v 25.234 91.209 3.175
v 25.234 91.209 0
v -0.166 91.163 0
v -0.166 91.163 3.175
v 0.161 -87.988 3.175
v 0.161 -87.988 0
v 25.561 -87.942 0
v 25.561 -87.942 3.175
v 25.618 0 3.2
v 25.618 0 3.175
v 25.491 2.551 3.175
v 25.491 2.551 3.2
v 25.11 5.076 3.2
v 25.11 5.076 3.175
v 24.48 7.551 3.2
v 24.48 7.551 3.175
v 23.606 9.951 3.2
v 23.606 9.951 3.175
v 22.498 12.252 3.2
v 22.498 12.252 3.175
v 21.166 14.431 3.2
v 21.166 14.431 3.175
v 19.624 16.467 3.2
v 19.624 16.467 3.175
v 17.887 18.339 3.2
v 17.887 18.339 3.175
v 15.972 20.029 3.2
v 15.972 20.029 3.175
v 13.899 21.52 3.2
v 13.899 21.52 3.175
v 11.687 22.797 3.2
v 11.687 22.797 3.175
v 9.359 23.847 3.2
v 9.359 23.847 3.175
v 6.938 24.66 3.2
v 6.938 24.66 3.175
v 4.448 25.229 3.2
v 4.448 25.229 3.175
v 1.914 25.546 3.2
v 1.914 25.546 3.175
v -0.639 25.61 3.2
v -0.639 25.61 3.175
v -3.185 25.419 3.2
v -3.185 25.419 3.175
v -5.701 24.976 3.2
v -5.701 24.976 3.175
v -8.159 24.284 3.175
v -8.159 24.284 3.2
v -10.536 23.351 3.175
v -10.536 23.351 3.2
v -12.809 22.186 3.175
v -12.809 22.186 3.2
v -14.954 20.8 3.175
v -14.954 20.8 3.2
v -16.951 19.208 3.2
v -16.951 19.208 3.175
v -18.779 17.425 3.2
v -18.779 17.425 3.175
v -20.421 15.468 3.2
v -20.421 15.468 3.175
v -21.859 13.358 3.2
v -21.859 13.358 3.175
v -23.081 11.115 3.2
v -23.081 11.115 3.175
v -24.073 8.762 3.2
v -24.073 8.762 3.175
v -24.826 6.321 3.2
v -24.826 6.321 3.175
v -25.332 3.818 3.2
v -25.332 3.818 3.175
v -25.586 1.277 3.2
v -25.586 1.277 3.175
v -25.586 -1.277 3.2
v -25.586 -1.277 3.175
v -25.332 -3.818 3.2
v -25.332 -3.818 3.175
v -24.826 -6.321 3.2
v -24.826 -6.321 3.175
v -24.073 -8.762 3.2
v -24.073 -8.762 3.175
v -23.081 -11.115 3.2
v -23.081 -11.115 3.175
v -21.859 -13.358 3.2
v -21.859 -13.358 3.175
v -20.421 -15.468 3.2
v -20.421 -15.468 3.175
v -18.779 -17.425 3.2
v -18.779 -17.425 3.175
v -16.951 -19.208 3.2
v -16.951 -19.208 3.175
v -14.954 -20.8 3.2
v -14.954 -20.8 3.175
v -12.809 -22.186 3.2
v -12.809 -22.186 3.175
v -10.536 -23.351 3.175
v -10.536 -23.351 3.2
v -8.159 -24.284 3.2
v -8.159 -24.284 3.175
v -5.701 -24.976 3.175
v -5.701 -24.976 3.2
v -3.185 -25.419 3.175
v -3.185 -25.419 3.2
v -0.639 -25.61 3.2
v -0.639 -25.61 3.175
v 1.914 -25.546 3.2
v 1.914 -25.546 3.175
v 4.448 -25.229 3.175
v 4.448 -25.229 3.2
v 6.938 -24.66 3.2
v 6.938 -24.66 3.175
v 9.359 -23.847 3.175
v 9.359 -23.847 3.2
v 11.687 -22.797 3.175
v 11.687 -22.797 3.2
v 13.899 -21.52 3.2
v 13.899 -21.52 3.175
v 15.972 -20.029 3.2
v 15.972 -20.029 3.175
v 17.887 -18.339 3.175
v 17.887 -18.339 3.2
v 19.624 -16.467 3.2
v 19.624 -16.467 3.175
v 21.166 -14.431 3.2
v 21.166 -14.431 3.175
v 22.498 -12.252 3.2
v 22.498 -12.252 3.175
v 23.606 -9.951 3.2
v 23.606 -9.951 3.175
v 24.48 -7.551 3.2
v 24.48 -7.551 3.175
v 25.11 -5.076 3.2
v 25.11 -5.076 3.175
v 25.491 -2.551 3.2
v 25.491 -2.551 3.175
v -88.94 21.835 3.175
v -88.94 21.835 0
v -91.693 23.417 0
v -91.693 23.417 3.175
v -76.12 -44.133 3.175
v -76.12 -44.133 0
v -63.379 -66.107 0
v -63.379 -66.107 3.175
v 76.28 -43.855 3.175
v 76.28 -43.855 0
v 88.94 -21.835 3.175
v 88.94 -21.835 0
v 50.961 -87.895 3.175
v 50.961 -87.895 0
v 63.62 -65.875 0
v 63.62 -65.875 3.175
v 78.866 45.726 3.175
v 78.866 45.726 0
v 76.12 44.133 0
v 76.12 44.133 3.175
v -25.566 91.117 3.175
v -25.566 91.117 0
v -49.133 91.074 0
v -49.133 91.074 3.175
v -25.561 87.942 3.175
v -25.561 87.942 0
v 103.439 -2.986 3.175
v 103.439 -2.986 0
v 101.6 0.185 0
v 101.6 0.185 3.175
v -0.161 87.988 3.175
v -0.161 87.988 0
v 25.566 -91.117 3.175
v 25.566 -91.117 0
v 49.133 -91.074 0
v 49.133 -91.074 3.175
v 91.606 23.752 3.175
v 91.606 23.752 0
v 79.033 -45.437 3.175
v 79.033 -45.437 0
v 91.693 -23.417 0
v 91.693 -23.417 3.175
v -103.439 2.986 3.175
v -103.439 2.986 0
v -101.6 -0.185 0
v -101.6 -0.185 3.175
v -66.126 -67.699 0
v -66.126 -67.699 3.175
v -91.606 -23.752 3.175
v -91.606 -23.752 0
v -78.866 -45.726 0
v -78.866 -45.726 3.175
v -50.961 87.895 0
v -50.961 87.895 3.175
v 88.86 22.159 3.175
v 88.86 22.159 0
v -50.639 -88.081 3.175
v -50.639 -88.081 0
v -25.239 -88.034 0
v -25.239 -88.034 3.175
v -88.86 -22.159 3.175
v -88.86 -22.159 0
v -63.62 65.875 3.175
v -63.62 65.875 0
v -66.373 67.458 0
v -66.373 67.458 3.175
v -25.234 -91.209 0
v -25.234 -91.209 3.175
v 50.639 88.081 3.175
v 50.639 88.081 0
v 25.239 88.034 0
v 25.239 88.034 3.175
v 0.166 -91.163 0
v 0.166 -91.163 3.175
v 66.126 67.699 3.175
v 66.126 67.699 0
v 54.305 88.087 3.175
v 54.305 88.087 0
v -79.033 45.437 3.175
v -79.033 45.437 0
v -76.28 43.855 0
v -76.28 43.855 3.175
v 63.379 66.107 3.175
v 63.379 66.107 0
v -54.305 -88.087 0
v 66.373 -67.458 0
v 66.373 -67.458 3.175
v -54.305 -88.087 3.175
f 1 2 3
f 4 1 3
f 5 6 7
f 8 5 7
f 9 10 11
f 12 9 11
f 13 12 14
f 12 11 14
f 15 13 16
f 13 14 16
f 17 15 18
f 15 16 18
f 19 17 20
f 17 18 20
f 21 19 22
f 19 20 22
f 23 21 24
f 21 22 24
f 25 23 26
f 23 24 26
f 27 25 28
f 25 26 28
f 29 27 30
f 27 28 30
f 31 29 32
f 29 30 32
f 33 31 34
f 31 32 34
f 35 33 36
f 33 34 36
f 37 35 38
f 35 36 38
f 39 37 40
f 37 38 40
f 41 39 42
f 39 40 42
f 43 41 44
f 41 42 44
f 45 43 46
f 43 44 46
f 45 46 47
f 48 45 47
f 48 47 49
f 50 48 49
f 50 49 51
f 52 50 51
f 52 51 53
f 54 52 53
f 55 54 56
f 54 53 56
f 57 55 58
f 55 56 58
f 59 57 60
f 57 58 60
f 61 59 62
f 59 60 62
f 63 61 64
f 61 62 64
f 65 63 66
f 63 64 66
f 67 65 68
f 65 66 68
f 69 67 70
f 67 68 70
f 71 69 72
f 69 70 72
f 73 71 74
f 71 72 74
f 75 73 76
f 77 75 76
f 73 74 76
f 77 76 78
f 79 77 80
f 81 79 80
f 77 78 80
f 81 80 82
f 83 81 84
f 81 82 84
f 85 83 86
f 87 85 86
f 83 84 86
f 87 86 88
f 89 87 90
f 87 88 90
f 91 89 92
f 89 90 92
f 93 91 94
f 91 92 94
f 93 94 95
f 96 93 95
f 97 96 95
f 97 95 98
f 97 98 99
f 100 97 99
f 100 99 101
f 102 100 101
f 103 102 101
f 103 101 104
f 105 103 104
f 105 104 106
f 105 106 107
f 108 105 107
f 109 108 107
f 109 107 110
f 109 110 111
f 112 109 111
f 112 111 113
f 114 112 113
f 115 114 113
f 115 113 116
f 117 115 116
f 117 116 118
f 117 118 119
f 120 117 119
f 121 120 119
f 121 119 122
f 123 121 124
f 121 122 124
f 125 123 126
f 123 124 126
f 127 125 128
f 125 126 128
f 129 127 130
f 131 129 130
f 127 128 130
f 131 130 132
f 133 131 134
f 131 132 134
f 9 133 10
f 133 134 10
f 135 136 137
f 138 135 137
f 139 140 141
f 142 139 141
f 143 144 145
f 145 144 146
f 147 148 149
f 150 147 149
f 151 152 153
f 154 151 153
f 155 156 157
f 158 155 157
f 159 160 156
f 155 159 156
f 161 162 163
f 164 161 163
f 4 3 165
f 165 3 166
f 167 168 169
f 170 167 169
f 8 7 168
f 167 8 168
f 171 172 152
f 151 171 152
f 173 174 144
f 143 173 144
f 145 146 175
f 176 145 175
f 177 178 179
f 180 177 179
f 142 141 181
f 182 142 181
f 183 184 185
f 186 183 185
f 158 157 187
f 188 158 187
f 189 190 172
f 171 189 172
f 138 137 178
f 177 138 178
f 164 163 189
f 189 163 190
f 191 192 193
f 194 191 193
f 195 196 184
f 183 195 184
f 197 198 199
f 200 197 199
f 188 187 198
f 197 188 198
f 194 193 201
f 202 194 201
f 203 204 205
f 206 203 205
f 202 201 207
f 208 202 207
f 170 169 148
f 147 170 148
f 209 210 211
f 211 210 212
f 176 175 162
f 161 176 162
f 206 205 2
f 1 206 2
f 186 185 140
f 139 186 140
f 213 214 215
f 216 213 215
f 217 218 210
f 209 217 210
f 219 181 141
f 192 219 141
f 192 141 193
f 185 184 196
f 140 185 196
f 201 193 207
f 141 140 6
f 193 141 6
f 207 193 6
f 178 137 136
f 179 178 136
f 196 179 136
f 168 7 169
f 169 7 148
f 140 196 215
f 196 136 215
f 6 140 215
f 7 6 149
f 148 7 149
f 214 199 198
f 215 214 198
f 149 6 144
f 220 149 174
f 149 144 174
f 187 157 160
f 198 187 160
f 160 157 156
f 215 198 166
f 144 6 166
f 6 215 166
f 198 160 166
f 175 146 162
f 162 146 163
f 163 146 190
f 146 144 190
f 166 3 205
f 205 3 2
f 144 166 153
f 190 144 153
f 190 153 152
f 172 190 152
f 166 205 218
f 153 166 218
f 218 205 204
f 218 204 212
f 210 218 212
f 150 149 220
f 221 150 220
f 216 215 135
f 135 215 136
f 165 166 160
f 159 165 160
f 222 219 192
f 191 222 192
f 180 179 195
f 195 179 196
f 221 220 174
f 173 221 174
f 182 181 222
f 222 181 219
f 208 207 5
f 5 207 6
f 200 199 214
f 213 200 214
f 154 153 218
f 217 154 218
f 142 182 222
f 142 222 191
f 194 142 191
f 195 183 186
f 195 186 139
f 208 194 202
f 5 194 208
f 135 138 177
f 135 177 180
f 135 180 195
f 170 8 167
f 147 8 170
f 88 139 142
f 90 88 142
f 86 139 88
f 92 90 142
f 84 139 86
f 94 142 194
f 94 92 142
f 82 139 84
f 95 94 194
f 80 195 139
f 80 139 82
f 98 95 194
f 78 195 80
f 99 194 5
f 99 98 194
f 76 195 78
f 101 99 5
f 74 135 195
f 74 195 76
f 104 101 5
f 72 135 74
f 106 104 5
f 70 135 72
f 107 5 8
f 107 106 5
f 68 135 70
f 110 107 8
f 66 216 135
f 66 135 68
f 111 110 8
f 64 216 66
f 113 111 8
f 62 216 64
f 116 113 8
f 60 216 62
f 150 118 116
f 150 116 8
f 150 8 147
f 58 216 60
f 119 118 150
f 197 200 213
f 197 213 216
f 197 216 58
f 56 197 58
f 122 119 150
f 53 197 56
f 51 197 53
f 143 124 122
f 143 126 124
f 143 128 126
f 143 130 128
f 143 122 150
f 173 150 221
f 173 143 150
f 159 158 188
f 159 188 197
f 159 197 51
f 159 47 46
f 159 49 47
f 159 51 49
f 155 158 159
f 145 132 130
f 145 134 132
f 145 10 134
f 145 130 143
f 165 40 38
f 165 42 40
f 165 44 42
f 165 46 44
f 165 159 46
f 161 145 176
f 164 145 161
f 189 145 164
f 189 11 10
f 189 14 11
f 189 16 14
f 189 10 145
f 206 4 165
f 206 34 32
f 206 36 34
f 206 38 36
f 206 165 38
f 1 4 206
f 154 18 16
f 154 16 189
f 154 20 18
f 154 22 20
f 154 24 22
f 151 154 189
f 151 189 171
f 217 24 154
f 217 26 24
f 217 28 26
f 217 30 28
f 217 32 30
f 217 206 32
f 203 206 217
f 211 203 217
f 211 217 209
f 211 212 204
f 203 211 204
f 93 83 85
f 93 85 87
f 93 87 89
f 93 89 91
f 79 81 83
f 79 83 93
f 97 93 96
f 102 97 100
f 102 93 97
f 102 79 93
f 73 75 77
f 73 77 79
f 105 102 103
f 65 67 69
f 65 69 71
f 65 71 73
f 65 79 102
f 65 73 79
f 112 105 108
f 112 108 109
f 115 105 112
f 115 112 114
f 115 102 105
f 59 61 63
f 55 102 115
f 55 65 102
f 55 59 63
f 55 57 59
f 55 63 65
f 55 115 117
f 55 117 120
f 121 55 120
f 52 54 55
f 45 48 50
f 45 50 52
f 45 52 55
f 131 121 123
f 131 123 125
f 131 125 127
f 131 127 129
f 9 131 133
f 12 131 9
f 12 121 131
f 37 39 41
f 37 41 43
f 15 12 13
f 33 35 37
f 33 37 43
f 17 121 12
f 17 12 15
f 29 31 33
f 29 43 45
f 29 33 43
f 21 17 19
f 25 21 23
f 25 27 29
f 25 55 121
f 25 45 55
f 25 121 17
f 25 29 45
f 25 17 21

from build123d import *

# Parameters (mm, degrees)
F1_DEPTH = 3.175
F2_R     = 25.617872
F3_DEPTH = 0.0254


with BuildPart() as f1:
    # F0 (on Top) → F1 (new body)
    with BuildSketch(Plane.XY):
        Polygon((63.379409, 66.106962), (50.639269, 88.080784), (25.239311, 88.034409), (-0.160646, 87.988034), (-25.560604, 87.94166), (-50.960562, 87.895285), (-63.620379, 65.875089), (-76.280196, 43.854893), (-88.940013, 21.834698), (-101.599831, -0.185498), (-88.85969, -22.15932), (-76.11955, -44.133141), (-63.379409, -66.106962), (-50.639269, -88.080784), (-25.239311, -88.034409), (0.160646, -87.988034), (25.560604, -87.94166), (50.960562, -87.895285), (63.620379, -65.875089), (76.280196, -43.854893), (88.940013, -21.834698), (101.599831, 0.185498), (88.85969, 22.15932), (76.11955, 44.133141), align=None)
        Polygon((-76.280196, 43.854893), (-63.620379, 65.875089), (-66.372903, 67.457566), (-79.032721, 45.437371), align=None)
        Polygon((-101.599831, -0.185498), (-88.940013, 21.834698), (-91.692538, 23.417175), (-103.438712, 2.98615), align=None)
        Polygon((-50.960562, 87.895285), (-25.560604, 87.94166), (-25.566401, 91.116654), (-49.133274, 91.073627), align=None)
        Polygon((-0.160646, 87.988034), (25.239311, 88.034409), (25.233515, 91.209404), (-0.166443, 91.163029), align=None)
        Polygon((54.305437, 88.087477), (50.639269, 88.080784), (63.379409, 66.106962), (66.126137, 67.69948), align=None)
        Polygon((78.866278, 45.725658), (76.11955, 44.133141), (88.85969, 22.15932), (91.606418, 23.751837), align=None)
        Polygon((103.438712, -2.98615), (101.599831, 0.185498), (88.940013, -21.834698), (91.692538, -23.417175), align=None)
        Polygon((79.032721, -45.437371), (76.280196, -43.854893), (63.620379, -65.875089), (66.372903, -67.457566), align=None)
        Polygon((49.133274, -91.073627), (50.960562, -87.895285), (25.560604, -87.94166), (25.566401, -91.116654), align=None)
        Polygon((0.166443, -91.163029), (0.160646, -87.988034), (-25.239311, -88.034409), (-25.233515, -91.209404), align=None)
        Polygon((-50.639269, -88.080784), (-63.379409, -66.106962), (-66.126137, -67.69948), (-54.305437, -88.087477), align=None)
        Polygon((-76.11955, -44.133141), (-88.85969, -22.15932), (-91.606418, -23.751837), (-78.866278, -45.725658), align=None)
    extrude(amount=F1_DEPTH)

    # F2 (on face) → F3 (join)
    with BuildSketch(Plane.XY.offset(3.175)):
        Circle(F2_R)
    extrude(amount=F3_DEPTH)


solid = f1.part
